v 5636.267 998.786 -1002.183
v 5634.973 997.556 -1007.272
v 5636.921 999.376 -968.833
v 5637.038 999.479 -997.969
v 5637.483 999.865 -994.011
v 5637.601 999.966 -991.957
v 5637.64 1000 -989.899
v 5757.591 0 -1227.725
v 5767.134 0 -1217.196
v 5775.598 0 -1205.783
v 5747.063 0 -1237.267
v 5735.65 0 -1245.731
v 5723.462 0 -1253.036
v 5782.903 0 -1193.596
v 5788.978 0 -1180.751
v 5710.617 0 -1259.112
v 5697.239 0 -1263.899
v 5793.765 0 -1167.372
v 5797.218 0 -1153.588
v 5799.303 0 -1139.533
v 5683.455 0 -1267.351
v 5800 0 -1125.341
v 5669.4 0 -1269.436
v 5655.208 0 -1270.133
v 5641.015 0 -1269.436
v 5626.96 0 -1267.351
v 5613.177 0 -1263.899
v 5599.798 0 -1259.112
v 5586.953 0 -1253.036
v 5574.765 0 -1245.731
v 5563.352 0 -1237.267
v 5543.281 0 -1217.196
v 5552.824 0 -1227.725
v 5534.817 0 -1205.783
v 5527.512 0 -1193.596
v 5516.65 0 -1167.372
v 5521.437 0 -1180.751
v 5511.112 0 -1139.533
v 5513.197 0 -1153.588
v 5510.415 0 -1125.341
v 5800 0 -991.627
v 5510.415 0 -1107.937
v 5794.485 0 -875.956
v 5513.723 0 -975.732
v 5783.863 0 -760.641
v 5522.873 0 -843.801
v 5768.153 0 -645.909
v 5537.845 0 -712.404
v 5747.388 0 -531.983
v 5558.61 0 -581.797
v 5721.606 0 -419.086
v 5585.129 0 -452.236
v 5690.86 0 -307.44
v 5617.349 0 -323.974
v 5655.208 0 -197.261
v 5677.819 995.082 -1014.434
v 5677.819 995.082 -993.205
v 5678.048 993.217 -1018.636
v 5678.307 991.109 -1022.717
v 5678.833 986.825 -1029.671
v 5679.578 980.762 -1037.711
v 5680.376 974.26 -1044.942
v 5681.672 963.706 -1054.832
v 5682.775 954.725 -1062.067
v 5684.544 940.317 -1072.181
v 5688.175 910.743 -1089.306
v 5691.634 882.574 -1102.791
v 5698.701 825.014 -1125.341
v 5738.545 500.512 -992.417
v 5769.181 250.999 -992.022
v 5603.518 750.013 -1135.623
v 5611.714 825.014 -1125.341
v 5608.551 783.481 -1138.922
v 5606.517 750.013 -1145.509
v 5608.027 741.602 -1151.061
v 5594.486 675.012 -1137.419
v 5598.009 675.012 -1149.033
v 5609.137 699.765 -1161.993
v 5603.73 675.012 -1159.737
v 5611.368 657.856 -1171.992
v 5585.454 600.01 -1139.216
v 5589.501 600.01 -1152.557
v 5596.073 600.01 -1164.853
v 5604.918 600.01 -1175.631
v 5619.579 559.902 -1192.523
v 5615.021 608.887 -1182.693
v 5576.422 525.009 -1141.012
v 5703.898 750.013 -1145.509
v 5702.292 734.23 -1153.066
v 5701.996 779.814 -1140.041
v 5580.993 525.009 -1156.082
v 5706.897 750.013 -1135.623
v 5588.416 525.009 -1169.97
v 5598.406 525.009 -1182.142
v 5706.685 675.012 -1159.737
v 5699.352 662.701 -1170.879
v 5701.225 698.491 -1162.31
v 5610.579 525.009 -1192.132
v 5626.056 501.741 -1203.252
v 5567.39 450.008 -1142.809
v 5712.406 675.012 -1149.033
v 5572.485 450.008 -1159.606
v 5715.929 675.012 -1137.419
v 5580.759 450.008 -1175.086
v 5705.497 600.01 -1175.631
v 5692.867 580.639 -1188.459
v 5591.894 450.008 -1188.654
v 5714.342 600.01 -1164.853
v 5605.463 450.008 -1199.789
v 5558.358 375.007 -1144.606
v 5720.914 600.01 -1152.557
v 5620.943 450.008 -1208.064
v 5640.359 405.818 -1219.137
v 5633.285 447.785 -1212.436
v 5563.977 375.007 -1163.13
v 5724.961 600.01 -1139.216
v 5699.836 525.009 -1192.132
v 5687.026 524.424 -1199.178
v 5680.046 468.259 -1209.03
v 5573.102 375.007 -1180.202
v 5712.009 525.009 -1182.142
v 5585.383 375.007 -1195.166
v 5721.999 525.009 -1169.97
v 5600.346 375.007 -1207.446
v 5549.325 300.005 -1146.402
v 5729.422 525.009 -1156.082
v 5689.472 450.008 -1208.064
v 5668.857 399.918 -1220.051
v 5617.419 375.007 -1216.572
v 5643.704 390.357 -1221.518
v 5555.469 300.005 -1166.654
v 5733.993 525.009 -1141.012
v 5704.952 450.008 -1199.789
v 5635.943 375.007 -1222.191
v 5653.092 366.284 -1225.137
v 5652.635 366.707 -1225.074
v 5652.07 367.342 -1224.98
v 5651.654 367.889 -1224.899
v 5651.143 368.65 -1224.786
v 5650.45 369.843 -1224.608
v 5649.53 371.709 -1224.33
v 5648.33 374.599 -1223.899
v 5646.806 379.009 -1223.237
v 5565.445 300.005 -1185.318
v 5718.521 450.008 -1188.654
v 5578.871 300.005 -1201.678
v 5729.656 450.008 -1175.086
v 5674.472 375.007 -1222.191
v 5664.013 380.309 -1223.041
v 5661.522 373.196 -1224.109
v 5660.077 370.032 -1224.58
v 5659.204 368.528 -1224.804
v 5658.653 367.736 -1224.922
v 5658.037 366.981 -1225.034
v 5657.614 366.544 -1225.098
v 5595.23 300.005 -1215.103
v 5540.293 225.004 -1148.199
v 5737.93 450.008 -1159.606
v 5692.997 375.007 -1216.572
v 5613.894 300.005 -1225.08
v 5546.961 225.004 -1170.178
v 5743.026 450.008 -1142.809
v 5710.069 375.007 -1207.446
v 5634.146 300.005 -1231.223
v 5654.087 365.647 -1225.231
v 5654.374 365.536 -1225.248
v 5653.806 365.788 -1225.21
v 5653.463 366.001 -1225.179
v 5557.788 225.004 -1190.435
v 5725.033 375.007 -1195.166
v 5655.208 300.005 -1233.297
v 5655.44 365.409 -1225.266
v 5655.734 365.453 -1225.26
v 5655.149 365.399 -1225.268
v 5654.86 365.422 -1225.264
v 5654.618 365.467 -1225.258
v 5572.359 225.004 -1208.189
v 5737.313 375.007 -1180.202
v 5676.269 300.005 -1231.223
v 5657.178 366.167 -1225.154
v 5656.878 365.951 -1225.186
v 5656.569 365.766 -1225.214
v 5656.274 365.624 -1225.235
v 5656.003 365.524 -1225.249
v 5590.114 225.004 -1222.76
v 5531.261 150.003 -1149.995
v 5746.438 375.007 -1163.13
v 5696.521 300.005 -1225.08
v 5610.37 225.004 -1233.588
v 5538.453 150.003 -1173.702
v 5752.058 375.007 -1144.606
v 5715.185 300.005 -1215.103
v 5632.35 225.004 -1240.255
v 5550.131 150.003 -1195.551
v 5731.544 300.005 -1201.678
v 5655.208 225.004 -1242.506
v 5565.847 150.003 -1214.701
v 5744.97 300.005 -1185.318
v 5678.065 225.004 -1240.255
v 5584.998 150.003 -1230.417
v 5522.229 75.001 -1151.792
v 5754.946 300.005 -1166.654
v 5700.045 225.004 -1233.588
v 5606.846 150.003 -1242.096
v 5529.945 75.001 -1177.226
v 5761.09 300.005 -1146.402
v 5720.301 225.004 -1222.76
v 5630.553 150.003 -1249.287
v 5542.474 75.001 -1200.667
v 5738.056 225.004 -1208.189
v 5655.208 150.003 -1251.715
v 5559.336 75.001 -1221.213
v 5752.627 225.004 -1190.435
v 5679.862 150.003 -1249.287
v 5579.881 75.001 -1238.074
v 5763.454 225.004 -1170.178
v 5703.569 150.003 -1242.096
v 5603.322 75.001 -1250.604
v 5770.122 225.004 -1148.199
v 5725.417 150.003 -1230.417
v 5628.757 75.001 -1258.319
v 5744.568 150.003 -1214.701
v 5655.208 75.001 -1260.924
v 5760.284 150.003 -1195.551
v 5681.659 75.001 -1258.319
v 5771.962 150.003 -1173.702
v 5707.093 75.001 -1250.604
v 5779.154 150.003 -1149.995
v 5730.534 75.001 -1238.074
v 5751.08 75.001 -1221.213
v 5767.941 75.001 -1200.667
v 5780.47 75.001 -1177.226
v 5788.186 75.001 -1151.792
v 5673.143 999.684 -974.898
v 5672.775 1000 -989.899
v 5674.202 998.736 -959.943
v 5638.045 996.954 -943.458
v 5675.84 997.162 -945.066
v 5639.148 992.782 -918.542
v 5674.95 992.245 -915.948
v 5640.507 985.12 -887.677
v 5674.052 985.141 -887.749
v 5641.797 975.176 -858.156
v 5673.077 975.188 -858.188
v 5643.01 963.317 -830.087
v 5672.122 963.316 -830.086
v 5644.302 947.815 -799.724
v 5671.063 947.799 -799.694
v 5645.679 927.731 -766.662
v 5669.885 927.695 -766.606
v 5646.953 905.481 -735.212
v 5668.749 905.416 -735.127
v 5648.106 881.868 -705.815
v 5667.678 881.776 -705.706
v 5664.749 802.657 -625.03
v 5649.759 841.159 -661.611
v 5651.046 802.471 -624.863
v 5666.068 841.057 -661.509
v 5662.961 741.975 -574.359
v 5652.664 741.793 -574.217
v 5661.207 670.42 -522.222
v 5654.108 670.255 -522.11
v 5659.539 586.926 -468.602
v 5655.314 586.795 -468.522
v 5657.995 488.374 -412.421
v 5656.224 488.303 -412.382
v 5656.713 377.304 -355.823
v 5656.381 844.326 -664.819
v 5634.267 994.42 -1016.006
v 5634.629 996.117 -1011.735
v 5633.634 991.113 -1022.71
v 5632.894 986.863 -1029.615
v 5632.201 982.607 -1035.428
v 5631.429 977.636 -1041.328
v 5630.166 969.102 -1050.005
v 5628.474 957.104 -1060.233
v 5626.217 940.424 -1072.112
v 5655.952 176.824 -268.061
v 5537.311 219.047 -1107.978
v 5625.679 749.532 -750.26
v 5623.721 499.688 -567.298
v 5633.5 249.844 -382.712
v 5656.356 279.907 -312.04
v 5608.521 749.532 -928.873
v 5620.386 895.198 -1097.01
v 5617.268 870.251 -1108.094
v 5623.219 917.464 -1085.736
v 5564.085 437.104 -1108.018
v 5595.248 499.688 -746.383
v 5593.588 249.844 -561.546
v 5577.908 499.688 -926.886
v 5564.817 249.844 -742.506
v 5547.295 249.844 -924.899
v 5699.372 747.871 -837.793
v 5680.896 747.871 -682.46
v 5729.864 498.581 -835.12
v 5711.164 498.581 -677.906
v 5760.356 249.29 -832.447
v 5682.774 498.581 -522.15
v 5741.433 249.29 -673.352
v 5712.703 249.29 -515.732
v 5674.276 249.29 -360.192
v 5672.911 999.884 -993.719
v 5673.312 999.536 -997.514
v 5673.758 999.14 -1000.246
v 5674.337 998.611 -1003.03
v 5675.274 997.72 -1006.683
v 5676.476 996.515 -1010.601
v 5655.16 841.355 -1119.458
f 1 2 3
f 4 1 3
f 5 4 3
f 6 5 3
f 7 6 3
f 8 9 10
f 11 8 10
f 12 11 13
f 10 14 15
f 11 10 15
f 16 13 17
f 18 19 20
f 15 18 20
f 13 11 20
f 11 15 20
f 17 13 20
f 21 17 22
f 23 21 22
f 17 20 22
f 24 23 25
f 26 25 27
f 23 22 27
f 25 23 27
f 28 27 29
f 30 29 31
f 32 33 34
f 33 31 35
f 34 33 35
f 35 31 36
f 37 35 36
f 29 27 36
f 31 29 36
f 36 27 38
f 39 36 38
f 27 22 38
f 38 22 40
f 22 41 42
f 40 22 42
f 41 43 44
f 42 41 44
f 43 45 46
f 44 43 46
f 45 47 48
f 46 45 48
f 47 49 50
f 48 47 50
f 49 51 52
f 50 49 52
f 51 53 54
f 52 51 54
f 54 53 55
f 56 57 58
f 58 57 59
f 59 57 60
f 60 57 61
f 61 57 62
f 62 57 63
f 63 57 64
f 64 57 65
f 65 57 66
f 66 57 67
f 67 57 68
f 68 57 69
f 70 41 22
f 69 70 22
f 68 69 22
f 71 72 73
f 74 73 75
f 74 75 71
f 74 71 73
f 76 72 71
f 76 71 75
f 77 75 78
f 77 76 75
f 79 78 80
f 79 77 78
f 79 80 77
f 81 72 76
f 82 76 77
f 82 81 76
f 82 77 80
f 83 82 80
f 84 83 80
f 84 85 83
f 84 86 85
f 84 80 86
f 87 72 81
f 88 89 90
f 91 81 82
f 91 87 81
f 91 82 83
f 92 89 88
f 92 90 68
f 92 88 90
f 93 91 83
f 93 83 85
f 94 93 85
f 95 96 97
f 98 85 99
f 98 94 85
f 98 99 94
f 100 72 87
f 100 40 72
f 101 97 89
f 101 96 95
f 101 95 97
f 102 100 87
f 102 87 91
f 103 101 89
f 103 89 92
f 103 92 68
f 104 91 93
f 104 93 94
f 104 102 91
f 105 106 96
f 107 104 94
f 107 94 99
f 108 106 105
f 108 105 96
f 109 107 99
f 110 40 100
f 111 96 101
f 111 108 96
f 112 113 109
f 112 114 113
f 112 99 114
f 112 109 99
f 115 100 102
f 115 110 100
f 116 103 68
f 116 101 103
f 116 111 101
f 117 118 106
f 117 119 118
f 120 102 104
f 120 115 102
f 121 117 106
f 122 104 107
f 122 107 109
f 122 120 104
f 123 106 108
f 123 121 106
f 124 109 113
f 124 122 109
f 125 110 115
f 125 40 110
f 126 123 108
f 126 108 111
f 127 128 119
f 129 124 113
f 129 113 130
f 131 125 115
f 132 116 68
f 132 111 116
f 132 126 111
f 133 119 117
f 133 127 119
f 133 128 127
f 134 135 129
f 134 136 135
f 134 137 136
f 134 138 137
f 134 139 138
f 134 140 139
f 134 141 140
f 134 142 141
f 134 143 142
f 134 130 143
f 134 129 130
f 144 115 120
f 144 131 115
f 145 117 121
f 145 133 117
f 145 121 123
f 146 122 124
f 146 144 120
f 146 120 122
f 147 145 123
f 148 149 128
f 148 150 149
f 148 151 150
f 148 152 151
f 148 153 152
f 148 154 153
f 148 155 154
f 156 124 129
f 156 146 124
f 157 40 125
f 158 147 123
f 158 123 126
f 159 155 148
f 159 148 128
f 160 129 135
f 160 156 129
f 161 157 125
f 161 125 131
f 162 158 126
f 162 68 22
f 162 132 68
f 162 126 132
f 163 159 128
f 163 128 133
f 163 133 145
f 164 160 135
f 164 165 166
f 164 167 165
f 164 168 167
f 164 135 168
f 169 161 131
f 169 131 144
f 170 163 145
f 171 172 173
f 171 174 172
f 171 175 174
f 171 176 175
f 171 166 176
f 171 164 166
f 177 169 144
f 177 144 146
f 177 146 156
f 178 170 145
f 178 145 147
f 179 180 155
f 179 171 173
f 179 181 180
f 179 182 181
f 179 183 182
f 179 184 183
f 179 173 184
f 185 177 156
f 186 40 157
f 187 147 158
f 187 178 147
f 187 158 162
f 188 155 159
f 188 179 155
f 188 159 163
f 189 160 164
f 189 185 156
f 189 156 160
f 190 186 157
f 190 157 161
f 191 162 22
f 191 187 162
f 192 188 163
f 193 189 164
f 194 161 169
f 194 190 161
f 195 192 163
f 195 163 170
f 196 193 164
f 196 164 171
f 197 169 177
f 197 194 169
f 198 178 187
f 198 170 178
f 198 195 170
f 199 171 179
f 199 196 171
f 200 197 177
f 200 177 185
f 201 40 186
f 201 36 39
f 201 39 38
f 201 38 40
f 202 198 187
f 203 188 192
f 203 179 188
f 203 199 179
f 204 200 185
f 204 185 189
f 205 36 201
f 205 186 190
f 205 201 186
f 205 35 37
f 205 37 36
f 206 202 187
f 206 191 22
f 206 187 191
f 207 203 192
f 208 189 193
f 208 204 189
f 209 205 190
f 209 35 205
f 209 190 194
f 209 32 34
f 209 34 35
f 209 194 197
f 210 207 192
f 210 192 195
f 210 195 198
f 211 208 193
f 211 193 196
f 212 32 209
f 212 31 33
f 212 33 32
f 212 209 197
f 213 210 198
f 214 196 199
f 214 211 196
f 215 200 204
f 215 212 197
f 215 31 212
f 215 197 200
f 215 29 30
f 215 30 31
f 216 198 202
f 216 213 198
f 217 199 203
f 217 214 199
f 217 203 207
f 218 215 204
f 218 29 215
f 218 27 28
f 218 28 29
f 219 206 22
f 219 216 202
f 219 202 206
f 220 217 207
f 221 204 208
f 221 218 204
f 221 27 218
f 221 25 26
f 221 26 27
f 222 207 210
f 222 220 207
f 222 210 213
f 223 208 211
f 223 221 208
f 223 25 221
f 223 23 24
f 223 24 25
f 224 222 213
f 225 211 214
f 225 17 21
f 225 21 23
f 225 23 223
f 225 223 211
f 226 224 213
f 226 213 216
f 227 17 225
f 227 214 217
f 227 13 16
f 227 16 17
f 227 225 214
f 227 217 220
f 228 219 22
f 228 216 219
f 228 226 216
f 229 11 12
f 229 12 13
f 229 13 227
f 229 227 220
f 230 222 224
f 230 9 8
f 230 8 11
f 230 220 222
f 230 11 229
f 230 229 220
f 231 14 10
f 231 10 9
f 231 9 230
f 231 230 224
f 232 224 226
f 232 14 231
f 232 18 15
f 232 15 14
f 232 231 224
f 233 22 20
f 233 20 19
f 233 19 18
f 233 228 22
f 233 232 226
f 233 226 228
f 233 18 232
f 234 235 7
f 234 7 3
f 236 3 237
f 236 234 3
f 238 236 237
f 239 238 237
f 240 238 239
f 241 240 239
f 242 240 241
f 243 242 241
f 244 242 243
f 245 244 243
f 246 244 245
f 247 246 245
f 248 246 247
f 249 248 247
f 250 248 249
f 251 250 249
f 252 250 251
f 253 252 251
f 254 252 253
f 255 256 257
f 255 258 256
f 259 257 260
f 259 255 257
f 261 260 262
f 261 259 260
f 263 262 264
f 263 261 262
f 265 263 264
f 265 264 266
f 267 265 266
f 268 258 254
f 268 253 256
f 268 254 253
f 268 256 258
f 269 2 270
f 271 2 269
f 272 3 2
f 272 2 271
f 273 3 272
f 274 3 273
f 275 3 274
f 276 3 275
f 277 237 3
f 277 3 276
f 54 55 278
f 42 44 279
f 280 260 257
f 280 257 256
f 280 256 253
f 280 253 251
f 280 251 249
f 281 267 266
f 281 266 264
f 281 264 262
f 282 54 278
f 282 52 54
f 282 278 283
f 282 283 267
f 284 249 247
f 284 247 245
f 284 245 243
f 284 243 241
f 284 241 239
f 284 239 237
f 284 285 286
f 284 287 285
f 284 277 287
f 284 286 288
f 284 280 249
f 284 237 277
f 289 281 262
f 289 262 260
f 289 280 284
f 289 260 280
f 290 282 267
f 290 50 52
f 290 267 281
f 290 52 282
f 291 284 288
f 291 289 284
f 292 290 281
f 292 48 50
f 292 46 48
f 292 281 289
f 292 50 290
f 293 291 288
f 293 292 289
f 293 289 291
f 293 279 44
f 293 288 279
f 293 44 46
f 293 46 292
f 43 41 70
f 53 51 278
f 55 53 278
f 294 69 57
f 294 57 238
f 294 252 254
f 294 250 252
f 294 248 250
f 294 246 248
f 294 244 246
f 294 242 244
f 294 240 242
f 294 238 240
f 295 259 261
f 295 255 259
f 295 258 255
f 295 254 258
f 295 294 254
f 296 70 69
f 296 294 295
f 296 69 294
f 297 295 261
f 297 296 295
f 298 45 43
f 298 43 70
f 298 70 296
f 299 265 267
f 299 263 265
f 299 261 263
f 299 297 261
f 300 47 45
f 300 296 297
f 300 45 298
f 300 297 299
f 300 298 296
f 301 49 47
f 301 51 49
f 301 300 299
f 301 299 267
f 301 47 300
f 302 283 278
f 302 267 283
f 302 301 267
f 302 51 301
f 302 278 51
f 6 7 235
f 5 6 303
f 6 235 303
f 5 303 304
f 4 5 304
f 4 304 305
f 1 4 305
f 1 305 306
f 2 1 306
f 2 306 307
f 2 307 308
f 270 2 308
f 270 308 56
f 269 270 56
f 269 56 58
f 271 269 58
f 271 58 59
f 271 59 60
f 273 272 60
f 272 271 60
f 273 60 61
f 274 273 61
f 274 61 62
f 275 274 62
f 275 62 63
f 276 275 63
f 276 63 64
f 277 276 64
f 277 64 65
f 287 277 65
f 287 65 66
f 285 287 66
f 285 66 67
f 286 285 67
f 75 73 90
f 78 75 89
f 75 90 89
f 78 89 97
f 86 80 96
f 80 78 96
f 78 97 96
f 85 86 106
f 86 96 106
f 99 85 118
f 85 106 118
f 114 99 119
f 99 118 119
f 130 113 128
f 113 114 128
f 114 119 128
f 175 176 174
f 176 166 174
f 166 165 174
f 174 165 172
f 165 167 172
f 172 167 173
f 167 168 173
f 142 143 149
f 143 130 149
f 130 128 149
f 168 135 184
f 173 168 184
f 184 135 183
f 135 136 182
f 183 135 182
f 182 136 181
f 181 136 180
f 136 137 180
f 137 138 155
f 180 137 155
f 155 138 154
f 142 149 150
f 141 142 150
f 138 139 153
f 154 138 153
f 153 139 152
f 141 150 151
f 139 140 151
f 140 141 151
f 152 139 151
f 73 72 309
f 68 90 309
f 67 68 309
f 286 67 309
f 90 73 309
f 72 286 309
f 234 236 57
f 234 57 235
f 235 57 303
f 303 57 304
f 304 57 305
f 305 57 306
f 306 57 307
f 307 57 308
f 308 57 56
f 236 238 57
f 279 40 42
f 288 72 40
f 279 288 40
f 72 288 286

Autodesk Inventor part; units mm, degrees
sketch "Sketch4" plane through (0, 0, 0) normal (0, 1, 0) x (-1, 0, 0)
  line L0 (-5800, -1270.1333) -> (-5792.2877, -1270.1333)
  line L1 (-5510.4151, -1125.3409) -> (-5510.4151, -1107.9379)
  line L2 (-5800, -991.6276) -> (-5800, -1125.3409)
  arc A0 (-5800, -1125.3409) -> (-5510.4151, -1125.3409) centre (-5655.2076, -1125.3409) ccw
  arc A1 (-5510.4151, -1125.3409) -> (-5655.2076, -197.2614) centre (-8501.4039, -1116.6394) ccw
  arc A2 (-5655.2076, -197.2614) -> (-5800, -1125.3409) centre (-3181.7697, -1058.4843) ccw
  line L3 (-5792.2877, -1270.1333) -> (-5510.4151, -1270.1333)
  line L4 (-5510.4151, -1270.1333) -> (-5510.4151, -1125.3409)
  line L5 (-5792.2877, -1125.3409) -> (-5792.2877, -1270.1333)
  point P0 (0, 0)
  point P1 (0, 0)
extrude "Extrusion1" add sketch "Sketch4" along normal blind 1000 draft -7 contours A0 L2 A2 A1 L1
ref_plane "Work Plane4" through (5800, 0, -1288.0909) normal (0, 0, 1) x (-0.1218693, 0.9925462, 0)
ref_plane "Work Plane3" through (5800, 0, -1125.3409) normal (0, 0, 1) x (-0.1218693, 0.9925462, 0)
ref_plane "Work Plane5" through (5851, 0, 0) normal (1, 0, 0) x (0, 1, 0)
ref_plane "Work Plane6" through (0, 0, -1300) normal (0, 0, 1) x (1, 0, 0)
sketch "Sketch8" plane through (0, 0, -1300) normal (0, 0, 1) x (1, 0, 0)
  line L0 (5800, 0) -> (5510.4151, 0) projected
  line L1 (5655.2076, 0) -> (5655.2076, 1007.4423)
  line L2 (5800, 0) -> (5510.4151, 0)
  ellipse E0 centre (5655.2076, 0) end of major axis (5655.2076, 1007.4423) minor radius 144.7924 (5800, 0) -> (5510.4151, 0) ccw
  point P0 (0, 0)
extrude "Extrusion4" cut sketch "Sketch8" along normal blind 1274.25 keep common part
ref_plane "Work Plane7" through (5882, 0, 0) normal (1, 0, 0) x (0, 1, 0)
sketch "Sketch9" plane through (5882, 0, 0) normal (1, 0, 0) x (0, 1, 0)
  line L0 (0, -1107.9379) -> (0, -197.2614) projected
  line L1 (0, -197.2614) -> (0, -989.8992)
  line L2 (0, -1270.1333) -> (0, -1125.3409) projected
  line L3 (0, -1270.1333) -> (0, -989.8992)
  line L4 (1000, -741.3614) -> (1000, -1108.1184) projected
  line L5 (1000, -989.8992) -> (1000, -567.7514) construction
  line L6 (1000, -567.7514) -> (0, -197.2614) construction
  spline S0 degree 2 poles (1000, -989.8992) (1000, -567.7514) (0, -197.2614) knots 1 1 1 2 2 2
  line L7 (1000, -989.8992) -> (1000, -1167.4476) construction
  line L8 (1000, -1125.3409) -> (1000, -1147.3488) projected
  line L9 (1000, -1167.4476) -> (0, -1270.1333) construction
  spline S1 degree 2 poles (1000, -989.8992) (1000, -1167.4476) (0, -1270.1333) knots 1 1 1 2 2 2
  point P0 (0, 0)
extrude "Extrusion5" cut sketch "Sketch9" against normal blind 1274.25 keep common part
